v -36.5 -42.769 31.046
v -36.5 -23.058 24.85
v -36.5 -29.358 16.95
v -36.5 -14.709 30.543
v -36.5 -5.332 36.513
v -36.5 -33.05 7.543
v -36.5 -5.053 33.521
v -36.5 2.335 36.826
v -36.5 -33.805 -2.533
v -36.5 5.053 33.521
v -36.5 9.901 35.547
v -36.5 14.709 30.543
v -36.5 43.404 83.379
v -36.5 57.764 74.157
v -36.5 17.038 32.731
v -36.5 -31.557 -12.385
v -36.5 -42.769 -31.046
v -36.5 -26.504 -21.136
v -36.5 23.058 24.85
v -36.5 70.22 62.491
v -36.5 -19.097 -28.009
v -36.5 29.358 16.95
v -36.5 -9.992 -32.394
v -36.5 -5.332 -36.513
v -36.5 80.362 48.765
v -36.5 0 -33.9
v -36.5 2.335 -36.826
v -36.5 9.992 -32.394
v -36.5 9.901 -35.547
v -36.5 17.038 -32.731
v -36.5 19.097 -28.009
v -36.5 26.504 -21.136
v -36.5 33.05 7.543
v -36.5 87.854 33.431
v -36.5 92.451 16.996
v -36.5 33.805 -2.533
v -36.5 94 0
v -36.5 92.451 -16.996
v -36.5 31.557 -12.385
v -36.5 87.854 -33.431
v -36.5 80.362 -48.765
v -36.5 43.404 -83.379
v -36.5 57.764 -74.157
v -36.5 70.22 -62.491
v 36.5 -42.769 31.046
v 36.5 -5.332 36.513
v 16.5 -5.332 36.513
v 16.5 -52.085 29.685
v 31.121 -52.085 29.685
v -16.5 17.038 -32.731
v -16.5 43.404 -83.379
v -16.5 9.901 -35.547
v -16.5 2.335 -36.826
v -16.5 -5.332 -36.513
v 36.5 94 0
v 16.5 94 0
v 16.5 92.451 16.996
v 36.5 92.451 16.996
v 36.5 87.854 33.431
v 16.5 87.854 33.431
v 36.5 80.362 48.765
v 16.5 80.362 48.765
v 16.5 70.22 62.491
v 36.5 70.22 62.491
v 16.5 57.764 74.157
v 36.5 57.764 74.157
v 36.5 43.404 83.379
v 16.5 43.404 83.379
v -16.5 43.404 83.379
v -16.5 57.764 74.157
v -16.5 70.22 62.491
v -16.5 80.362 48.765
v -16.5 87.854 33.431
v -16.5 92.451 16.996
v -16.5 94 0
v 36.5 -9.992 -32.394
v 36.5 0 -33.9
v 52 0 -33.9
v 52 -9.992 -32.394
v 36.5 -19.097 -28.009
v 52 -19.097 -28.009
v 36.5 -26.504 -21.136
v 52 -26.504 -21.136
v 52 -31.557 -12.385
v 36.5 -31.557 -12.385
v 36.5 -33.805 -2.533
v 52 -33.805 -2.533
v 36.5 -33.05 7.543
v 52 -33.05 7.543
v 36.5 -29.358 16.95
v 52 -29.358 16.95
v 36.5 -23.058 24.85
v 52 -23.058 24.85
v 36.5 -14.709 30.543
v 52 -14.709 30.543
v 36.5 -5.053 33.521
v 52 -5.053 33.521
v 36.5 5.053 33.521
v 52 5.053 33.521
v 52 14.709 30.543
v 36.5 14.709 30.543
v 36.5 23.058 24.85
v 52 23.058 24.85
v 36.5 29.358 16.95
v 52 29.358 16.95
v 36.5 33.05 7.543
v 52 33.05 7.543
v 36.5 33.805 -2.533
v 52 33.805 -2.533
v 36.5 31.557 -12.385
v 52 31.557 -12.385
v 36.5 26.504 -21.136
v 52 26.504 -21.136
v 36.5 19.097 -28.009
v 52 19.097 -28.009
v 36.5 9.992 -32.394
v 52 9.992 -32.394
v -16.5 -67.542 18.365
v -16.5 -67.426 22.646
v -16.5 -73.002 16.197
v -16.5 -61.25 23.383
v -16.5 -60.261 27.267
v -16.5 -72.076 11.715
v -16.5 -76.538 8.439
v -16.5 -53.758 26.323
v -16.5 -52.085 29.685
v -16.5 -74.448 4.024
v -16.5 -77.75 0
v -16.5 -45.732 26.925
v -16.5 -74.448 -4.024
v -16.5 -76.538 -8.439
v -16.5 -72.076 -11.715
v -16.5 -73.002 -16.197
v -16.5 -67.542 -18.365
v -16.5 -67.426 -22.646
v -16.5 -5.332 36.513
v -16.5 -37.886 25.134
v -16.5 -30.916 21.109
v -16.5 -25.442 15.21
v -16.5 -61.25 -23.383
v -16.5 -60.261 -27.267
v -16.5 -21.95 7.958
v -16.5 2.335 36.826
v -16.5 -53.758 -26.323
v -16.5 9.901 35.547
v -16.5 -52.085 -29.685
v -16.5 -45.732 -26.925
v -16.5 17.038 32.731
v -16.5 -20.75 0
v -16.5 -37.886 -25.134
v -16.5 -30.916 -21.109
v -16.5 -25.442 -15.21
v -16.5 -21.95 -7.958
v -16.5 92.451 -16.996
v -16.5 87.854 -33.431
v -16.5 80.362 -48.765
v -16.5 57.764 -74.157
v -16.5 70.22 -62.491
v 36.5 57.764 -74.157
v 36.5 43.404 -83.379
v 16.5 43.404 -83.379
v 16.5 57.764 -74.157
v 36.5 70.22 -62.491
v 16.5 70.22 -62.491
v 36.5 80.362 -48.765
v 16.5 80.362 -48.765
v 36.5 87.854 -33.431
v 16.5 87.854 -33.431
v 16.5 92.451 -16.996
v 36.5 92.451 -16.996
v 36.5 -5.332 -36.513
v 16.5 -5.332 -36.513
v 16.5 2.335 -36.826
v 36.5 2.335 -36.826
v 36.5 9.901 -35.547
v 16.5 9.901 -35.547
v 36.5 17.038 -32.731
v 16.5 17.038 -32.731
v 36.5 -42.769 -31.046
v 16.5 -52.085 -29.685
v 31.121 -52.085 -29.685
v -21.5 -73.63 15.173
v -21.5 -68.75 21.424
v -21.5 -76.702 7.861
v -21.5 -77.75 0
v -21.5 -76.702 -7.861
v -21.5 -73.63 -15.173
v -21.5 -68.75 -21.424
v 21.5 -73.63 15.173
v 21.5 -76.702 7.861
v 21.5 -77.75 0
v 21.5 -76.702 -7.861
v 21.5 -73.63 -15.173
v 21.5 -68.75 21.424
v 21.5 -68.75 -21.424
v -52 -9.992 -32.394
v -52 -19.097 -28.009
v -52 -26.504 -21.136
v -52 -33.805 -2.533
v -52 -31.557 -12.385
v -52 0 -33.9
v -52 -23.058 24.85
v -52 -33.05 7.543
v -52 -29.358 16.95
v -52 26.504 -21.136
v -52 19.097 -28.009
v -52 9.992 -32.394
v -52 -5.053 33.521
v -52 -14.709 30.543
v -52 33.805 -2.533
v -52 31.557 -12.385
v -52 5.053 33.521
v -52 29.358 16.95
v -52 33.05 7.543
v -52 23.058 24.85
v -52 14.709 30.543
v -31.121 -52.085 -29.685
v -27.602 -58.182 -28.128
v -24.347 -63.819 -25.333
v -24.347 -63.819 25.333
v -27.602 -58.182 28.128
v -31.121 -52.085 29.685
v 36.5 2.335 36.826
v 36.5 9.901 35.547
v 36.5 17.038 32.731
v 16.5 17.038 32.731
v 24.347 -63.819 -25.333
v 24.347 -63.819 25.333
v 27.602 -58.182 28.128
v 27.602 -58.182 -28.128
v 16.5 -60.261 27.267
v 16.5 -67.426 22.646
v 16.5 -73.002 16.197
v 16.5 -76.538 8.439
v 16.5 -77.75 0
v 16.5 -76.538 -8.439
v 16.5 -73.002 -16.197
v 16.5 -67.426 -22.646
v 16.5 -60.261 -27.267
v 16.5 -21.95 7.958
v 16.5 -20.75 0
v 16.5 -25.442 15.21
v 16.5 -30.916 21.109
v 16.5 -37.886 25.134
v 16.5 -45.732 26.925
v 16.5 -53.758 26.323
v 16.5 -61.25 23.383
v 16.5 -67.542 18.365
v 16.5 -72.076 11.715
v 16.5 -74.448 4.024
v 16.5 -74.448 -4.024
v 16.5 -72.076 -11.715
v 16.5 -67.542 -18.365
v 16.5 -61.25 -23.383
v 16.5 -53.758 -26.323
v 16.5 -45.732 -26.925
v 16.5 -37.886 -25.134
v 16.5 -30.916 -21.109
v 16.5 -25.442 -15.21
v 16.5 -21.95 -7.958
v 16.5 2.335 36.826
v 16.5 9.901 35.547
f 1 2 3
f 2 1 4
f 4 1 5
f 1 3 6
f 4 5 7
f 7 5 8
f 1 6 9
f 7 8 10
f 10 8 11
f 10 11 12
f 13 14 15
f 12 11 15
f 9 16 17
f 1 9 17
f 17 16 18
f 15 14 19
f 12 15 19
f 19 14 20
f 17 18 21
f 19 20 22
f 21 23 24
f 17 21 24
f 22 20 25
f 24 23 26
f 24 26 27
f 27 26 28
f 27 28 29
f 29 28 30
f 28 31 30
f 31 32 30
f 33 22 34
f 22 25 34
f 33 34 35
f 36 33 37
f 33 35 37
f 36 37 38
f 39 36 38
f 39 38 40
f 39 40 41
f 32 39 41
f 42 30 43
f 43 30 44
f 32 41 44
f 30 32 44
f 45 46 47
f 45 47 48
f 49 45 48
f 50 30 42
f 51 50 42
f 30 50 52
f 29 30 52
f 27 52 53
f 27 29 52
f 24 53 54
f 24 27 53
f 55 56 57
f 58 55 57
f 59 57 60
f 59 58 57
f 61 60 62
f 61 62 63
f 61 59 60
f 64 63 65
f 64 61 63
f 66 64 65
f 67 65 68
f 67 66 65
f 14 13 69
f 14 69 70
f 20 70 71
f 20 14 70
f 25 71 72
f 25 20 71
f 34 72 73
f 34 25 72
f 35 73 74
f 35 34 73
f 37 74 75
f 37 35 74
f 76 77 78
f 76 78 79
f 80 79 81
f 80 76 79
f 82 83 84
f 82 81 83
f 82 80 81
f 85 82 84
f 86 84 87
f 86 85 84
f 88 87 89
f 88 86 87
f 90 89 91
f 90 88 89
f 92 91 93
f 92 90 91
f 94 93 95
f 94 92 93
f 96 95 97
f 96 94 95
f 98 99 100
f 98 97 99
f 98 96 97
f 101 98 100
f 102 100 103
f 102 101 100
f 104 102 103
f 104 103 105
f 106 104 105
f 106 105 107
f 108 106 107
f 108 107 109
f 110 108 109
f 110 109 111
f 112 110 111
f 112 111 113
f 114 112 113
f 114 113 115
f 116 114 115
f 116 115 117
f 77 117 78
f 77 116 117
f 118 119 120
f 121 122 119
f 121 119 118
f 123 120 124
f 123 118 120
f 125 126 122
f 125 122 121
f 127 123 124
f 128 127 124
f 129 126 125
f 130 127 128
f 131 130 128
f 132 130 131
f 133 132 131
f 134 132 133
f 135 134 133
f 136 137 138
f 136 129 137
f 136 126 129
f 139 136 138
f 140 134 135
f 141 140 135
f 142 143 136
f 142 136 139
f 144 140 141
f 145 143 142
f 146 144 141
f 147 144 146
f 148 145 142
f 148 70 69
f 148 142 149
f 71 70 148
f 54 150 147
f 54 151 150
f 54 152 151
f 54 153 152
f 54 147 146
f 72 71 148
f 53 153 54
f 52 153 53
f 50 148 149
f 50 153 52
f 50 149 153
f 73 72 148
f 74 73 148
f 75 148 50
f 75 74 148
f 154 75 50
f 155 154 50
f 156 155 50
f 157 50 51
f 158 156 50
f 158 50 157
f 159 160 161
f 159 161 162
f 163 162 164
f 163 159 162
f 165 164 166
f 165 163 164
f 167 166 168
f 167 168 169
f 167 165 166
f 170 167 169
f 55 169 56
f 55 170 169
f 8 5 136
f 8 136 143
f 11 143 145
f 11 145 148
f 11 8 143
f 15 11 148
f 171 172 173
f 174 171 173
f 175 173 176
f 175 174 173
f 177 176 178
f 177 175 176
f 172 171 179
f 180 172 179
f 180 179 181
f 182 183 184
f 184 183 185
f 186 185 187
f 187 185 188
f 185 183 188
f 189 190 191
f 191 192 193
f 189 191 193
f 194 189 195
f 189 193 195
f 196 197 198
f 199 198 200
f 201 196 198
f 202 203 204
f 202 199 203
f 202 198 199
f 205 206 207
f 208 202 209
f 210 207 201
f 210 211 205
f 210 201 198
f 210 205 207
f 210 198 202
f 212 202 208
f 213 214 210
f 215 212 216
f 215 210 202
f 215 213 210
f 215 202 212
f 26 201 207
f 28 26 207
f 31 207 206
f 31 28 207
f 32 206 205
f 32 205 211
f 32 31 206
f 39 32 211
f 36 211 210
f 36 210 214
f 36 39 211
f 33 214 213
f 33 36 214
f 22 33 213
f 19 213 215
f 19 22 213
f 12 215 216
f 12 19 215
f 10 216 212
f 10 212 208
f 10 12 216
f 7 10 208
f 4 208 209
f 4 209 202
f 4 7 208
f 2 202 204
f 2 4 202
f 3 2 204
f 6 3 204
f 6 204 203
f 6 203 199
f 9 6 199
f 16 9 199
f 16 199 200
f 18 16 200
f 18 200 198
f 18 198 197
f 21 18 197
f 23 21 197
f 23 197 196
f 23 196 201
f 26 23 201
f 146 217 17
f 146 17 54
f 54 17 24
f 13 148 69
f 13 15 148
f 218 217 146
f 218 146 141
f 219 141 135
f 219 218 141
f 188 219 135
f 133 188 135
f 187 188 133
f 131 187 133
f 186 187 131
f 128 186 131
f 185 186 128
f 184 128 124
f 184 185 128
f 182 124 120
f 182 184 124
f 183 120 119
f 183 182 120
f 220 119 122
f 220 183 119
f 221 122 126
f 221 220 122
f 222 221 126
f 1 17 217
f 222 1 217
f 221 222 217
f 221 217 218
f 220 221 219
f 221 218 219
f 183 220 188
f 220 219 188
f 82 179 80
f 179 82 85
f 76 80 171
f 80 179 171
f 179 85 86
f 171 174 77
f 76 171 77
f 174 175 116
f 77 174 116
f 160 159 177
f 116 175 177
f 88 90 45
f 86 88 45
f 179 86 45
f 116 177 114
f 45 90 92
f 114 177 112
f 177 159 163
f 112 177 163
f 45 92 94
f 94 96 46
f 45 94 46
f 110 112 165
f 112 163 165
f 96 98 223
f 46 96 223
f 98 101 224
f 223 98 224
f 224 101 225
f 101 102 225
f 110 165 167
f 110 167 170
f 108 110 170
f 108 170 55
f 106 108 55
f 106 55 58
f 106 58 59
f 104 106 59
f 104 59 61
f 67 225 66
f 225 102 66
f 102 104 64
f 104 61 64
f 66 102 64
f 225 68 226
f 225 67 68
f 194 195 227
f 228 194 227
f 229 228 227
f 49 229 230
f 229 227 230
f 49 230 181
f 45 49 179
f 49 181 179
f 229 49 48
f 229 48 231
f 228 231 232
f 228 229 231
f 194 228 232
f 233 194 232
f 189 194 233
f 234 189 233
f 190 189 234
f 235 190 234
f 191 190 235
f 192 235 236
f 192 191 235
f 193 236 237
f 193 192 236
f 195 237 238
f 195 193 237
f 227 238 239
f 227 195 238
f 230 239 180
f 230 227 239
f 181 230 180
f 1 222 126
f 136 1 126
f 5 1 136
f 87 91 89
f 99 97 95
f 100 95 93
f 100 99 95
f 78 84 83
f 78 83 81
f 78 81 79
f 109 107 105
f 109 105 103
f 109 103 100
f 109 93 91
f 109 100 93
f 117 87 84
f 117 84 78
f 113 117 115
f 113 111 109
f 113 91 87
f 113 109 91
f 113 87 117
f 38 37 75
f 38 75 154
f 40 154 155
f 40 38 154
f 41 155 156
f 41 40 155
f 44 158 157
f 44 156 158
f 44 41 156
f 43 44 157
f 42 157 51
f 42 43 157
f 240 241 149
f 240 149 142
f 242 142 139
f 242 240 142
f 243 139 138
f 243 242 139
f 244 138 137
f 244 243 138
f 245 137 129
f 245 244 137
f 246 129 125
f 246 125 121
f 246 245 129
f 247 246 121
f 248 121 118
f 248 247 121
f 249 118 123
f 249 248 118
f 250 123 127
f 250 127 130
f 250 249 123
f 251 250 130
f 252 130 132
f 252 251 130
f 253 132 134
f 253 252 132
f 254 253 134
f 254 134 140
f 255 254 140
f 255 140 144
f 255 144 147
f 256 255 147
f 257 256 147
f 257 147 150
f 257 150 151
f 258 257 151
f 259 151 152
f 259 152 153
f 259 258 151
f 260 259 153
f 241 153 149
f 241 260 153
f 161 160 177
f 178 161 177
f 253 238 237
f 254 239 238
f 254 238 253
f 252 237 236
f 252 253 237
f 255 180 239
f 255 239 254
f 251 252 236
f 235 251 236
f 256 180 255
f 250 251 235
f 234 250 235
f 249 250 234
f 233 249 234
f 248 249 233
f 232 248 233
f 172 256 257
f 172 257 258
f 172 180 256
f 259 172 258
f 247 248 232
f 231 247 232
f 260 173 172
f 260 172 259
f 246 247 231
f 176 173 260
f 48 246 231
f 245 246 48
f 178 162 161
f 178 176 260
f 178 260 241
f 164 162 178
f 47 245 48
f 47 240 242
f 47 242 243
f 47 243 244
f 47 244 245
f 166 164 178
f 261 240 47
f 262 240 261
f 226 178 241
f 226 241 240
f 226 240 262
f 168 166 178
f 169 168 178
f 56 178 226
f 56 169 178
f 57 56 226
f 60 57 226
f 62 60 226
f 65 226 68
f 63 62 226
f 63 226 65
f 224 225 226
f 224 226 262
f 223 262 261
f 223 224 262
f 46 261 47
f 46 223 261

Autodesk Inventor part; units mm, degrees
ref_plane "YZ Plane" through (0, 0, 0) normal (1, 0, 0) x (0, 1, 0)
ref_plane "XZ Plane" through (0, 0, 0) normal (0, 1, 0) x (-1, 0, 0)
sketch "Эскиз1" plane through (0, 0, 0) normal (1, 0, 0) x (0, 1, 0)
  circle A0 centre (0, 0) radius 27
  dimension "d0" = 54
extrude "Выдавливание1" add sketch "Эскиз1" along normal blind 16.5
ref_plane "РабПлоскость1" through (36.5, 0, 0) normal (1, 0, 0) x (0, 0, -1)
sketch "Эскиз2" plane through (36.5, 0, 0) normal (1, 0, 0) x (0, 0, -1)
  circle A0 centre (0, 47.75) radius 33.9
  point P0 (0, 0)
  dimension "d4" = 67.8
  dimension "d5" = 47.75
extrude "Выдавливание2" add sketch "Эскиз2" along normal blind 15.5
sketch "Эскиз3" plane through (36.5, 47.75, 0) normal (-1, 0, 0) x (0, 0, 1)
  circle A0 centre (0, 0) radius 33.9 projected
  arc A1 (-29.6851, -52.0851) -> (29.6851, -52.0851) centre (0, -47.75) ccw
  circle A2 centre (0, -47.75) radius 27 projected
  line L0 (36.5127, -5.3321) -> (29.6851, -52.0851)
  line L1 (-36.5127, -5.3321) -> (-29.6851, -52.0851)
  arc A3 (36.5127, -5.3321) -> (-36.5127, -5.3321) centre (0, 0) ccw
  dimension "d11" = 3
  dimension "d12" = 3
extrude "Выдавливание3" add sketch "Эскиз3" along normal up to surface (20 mm away) contours A0 A2 | A2 A0 | A0 A2 | L1 A3 L0 A1
sketch "Эскиз15" plane through (36.5, 47.75, 0) normal (1, 0, 0) x (0, 0, -1)
  arc A0 (0, 94) -> (-83.379, 43.4044) centre (0, 0) ccw
  line L0 (-83.379, 43.4044) -> (0, 0)
  line L1 (0, -114.4319) -> (0, 142.3414) projected
  arc A1 (83.379, 43.4044) -> (0, 94) centre (0, 0) ccw
  line L2 (83.379, 43.4044) -> (0, 0)
  arc A2 (36.5127, -5.3321) -> (-36.5127, -5.3321) centre (0, 0) ccw projected
  arc A3 (32.7307, 17.0385) -> (-32.7307, 17.0385) centre (0, 0) ccw
  point P0 (0, -47.75)
  dimension "d66" = 94
  dimension "d67" = 62.5
extrude "Выдавливание10" add sketch "Эскиз15" against normal up to surface (20 mm away) contours L1 A2 L0 A0 | A1 L2 A2 L1
sketch "Эскиз4" plane through (0, 0, 0) normal (0, 0, 1) x (1, 0, 0)
  line L0 (16.5, 31.9847) -> (31.5, 78.15)
  line L1 (31.5, 78.15) -> (31.5, 84.65)
  line L2 (36.5, 84.65) -> (16.5, 84.65) projected
  line L3 (31.5, 84.65) -> (31.0691, 84.65)
  line L4 (36.5, 84.65) -> (36.5, 42.4179) projected
  line L5 (16.5, 84.65) -> (16.5, 42.4179) projected
  line L6 (16.5, 84.65) -> (16.5, 31.9847)
  line L7 (36.5, -30) -> (16.5, -30) projected
  line L8 (21.5, -30) -> (21.5, -21)
  line L9 (21.5, -21) -> (36.5, 4.9808)
  line L10 (36.5, 4.9808) -> (36.5, -30)
  line L11 (36.5, -30) -> (21.5, -30)
  line L12 (16.5, -4.3351) -> (16.5, -30) projected
  point P0 (0, 0)
  dimension "d23" = 5
  dimension "d24" = 6.5
  dimension "d25" = 72
  dimension "d26" = 60
  dimension "d27" = 5
  dimension "d28" = 9
extrude "Выдавливание5" cut sketch "Эскиз4" along normal through all both and the other way through all contours L7 L8 L9 L10
mirror "Зеркальное отражение5" about plane through (0, 0, 0) normal (-1, 0, 0) of "Выдавливание3", "Выдавливание2", "Выдавливание10", "Выдавливание5", "Выдавливание1"
move or copy body "Переместить тело3" bodies to move or copy 1 copy no translate (0, -47.75, 0)
properties part number "crankshaft" material "Сталь, высокопрочная, низколегированная"
